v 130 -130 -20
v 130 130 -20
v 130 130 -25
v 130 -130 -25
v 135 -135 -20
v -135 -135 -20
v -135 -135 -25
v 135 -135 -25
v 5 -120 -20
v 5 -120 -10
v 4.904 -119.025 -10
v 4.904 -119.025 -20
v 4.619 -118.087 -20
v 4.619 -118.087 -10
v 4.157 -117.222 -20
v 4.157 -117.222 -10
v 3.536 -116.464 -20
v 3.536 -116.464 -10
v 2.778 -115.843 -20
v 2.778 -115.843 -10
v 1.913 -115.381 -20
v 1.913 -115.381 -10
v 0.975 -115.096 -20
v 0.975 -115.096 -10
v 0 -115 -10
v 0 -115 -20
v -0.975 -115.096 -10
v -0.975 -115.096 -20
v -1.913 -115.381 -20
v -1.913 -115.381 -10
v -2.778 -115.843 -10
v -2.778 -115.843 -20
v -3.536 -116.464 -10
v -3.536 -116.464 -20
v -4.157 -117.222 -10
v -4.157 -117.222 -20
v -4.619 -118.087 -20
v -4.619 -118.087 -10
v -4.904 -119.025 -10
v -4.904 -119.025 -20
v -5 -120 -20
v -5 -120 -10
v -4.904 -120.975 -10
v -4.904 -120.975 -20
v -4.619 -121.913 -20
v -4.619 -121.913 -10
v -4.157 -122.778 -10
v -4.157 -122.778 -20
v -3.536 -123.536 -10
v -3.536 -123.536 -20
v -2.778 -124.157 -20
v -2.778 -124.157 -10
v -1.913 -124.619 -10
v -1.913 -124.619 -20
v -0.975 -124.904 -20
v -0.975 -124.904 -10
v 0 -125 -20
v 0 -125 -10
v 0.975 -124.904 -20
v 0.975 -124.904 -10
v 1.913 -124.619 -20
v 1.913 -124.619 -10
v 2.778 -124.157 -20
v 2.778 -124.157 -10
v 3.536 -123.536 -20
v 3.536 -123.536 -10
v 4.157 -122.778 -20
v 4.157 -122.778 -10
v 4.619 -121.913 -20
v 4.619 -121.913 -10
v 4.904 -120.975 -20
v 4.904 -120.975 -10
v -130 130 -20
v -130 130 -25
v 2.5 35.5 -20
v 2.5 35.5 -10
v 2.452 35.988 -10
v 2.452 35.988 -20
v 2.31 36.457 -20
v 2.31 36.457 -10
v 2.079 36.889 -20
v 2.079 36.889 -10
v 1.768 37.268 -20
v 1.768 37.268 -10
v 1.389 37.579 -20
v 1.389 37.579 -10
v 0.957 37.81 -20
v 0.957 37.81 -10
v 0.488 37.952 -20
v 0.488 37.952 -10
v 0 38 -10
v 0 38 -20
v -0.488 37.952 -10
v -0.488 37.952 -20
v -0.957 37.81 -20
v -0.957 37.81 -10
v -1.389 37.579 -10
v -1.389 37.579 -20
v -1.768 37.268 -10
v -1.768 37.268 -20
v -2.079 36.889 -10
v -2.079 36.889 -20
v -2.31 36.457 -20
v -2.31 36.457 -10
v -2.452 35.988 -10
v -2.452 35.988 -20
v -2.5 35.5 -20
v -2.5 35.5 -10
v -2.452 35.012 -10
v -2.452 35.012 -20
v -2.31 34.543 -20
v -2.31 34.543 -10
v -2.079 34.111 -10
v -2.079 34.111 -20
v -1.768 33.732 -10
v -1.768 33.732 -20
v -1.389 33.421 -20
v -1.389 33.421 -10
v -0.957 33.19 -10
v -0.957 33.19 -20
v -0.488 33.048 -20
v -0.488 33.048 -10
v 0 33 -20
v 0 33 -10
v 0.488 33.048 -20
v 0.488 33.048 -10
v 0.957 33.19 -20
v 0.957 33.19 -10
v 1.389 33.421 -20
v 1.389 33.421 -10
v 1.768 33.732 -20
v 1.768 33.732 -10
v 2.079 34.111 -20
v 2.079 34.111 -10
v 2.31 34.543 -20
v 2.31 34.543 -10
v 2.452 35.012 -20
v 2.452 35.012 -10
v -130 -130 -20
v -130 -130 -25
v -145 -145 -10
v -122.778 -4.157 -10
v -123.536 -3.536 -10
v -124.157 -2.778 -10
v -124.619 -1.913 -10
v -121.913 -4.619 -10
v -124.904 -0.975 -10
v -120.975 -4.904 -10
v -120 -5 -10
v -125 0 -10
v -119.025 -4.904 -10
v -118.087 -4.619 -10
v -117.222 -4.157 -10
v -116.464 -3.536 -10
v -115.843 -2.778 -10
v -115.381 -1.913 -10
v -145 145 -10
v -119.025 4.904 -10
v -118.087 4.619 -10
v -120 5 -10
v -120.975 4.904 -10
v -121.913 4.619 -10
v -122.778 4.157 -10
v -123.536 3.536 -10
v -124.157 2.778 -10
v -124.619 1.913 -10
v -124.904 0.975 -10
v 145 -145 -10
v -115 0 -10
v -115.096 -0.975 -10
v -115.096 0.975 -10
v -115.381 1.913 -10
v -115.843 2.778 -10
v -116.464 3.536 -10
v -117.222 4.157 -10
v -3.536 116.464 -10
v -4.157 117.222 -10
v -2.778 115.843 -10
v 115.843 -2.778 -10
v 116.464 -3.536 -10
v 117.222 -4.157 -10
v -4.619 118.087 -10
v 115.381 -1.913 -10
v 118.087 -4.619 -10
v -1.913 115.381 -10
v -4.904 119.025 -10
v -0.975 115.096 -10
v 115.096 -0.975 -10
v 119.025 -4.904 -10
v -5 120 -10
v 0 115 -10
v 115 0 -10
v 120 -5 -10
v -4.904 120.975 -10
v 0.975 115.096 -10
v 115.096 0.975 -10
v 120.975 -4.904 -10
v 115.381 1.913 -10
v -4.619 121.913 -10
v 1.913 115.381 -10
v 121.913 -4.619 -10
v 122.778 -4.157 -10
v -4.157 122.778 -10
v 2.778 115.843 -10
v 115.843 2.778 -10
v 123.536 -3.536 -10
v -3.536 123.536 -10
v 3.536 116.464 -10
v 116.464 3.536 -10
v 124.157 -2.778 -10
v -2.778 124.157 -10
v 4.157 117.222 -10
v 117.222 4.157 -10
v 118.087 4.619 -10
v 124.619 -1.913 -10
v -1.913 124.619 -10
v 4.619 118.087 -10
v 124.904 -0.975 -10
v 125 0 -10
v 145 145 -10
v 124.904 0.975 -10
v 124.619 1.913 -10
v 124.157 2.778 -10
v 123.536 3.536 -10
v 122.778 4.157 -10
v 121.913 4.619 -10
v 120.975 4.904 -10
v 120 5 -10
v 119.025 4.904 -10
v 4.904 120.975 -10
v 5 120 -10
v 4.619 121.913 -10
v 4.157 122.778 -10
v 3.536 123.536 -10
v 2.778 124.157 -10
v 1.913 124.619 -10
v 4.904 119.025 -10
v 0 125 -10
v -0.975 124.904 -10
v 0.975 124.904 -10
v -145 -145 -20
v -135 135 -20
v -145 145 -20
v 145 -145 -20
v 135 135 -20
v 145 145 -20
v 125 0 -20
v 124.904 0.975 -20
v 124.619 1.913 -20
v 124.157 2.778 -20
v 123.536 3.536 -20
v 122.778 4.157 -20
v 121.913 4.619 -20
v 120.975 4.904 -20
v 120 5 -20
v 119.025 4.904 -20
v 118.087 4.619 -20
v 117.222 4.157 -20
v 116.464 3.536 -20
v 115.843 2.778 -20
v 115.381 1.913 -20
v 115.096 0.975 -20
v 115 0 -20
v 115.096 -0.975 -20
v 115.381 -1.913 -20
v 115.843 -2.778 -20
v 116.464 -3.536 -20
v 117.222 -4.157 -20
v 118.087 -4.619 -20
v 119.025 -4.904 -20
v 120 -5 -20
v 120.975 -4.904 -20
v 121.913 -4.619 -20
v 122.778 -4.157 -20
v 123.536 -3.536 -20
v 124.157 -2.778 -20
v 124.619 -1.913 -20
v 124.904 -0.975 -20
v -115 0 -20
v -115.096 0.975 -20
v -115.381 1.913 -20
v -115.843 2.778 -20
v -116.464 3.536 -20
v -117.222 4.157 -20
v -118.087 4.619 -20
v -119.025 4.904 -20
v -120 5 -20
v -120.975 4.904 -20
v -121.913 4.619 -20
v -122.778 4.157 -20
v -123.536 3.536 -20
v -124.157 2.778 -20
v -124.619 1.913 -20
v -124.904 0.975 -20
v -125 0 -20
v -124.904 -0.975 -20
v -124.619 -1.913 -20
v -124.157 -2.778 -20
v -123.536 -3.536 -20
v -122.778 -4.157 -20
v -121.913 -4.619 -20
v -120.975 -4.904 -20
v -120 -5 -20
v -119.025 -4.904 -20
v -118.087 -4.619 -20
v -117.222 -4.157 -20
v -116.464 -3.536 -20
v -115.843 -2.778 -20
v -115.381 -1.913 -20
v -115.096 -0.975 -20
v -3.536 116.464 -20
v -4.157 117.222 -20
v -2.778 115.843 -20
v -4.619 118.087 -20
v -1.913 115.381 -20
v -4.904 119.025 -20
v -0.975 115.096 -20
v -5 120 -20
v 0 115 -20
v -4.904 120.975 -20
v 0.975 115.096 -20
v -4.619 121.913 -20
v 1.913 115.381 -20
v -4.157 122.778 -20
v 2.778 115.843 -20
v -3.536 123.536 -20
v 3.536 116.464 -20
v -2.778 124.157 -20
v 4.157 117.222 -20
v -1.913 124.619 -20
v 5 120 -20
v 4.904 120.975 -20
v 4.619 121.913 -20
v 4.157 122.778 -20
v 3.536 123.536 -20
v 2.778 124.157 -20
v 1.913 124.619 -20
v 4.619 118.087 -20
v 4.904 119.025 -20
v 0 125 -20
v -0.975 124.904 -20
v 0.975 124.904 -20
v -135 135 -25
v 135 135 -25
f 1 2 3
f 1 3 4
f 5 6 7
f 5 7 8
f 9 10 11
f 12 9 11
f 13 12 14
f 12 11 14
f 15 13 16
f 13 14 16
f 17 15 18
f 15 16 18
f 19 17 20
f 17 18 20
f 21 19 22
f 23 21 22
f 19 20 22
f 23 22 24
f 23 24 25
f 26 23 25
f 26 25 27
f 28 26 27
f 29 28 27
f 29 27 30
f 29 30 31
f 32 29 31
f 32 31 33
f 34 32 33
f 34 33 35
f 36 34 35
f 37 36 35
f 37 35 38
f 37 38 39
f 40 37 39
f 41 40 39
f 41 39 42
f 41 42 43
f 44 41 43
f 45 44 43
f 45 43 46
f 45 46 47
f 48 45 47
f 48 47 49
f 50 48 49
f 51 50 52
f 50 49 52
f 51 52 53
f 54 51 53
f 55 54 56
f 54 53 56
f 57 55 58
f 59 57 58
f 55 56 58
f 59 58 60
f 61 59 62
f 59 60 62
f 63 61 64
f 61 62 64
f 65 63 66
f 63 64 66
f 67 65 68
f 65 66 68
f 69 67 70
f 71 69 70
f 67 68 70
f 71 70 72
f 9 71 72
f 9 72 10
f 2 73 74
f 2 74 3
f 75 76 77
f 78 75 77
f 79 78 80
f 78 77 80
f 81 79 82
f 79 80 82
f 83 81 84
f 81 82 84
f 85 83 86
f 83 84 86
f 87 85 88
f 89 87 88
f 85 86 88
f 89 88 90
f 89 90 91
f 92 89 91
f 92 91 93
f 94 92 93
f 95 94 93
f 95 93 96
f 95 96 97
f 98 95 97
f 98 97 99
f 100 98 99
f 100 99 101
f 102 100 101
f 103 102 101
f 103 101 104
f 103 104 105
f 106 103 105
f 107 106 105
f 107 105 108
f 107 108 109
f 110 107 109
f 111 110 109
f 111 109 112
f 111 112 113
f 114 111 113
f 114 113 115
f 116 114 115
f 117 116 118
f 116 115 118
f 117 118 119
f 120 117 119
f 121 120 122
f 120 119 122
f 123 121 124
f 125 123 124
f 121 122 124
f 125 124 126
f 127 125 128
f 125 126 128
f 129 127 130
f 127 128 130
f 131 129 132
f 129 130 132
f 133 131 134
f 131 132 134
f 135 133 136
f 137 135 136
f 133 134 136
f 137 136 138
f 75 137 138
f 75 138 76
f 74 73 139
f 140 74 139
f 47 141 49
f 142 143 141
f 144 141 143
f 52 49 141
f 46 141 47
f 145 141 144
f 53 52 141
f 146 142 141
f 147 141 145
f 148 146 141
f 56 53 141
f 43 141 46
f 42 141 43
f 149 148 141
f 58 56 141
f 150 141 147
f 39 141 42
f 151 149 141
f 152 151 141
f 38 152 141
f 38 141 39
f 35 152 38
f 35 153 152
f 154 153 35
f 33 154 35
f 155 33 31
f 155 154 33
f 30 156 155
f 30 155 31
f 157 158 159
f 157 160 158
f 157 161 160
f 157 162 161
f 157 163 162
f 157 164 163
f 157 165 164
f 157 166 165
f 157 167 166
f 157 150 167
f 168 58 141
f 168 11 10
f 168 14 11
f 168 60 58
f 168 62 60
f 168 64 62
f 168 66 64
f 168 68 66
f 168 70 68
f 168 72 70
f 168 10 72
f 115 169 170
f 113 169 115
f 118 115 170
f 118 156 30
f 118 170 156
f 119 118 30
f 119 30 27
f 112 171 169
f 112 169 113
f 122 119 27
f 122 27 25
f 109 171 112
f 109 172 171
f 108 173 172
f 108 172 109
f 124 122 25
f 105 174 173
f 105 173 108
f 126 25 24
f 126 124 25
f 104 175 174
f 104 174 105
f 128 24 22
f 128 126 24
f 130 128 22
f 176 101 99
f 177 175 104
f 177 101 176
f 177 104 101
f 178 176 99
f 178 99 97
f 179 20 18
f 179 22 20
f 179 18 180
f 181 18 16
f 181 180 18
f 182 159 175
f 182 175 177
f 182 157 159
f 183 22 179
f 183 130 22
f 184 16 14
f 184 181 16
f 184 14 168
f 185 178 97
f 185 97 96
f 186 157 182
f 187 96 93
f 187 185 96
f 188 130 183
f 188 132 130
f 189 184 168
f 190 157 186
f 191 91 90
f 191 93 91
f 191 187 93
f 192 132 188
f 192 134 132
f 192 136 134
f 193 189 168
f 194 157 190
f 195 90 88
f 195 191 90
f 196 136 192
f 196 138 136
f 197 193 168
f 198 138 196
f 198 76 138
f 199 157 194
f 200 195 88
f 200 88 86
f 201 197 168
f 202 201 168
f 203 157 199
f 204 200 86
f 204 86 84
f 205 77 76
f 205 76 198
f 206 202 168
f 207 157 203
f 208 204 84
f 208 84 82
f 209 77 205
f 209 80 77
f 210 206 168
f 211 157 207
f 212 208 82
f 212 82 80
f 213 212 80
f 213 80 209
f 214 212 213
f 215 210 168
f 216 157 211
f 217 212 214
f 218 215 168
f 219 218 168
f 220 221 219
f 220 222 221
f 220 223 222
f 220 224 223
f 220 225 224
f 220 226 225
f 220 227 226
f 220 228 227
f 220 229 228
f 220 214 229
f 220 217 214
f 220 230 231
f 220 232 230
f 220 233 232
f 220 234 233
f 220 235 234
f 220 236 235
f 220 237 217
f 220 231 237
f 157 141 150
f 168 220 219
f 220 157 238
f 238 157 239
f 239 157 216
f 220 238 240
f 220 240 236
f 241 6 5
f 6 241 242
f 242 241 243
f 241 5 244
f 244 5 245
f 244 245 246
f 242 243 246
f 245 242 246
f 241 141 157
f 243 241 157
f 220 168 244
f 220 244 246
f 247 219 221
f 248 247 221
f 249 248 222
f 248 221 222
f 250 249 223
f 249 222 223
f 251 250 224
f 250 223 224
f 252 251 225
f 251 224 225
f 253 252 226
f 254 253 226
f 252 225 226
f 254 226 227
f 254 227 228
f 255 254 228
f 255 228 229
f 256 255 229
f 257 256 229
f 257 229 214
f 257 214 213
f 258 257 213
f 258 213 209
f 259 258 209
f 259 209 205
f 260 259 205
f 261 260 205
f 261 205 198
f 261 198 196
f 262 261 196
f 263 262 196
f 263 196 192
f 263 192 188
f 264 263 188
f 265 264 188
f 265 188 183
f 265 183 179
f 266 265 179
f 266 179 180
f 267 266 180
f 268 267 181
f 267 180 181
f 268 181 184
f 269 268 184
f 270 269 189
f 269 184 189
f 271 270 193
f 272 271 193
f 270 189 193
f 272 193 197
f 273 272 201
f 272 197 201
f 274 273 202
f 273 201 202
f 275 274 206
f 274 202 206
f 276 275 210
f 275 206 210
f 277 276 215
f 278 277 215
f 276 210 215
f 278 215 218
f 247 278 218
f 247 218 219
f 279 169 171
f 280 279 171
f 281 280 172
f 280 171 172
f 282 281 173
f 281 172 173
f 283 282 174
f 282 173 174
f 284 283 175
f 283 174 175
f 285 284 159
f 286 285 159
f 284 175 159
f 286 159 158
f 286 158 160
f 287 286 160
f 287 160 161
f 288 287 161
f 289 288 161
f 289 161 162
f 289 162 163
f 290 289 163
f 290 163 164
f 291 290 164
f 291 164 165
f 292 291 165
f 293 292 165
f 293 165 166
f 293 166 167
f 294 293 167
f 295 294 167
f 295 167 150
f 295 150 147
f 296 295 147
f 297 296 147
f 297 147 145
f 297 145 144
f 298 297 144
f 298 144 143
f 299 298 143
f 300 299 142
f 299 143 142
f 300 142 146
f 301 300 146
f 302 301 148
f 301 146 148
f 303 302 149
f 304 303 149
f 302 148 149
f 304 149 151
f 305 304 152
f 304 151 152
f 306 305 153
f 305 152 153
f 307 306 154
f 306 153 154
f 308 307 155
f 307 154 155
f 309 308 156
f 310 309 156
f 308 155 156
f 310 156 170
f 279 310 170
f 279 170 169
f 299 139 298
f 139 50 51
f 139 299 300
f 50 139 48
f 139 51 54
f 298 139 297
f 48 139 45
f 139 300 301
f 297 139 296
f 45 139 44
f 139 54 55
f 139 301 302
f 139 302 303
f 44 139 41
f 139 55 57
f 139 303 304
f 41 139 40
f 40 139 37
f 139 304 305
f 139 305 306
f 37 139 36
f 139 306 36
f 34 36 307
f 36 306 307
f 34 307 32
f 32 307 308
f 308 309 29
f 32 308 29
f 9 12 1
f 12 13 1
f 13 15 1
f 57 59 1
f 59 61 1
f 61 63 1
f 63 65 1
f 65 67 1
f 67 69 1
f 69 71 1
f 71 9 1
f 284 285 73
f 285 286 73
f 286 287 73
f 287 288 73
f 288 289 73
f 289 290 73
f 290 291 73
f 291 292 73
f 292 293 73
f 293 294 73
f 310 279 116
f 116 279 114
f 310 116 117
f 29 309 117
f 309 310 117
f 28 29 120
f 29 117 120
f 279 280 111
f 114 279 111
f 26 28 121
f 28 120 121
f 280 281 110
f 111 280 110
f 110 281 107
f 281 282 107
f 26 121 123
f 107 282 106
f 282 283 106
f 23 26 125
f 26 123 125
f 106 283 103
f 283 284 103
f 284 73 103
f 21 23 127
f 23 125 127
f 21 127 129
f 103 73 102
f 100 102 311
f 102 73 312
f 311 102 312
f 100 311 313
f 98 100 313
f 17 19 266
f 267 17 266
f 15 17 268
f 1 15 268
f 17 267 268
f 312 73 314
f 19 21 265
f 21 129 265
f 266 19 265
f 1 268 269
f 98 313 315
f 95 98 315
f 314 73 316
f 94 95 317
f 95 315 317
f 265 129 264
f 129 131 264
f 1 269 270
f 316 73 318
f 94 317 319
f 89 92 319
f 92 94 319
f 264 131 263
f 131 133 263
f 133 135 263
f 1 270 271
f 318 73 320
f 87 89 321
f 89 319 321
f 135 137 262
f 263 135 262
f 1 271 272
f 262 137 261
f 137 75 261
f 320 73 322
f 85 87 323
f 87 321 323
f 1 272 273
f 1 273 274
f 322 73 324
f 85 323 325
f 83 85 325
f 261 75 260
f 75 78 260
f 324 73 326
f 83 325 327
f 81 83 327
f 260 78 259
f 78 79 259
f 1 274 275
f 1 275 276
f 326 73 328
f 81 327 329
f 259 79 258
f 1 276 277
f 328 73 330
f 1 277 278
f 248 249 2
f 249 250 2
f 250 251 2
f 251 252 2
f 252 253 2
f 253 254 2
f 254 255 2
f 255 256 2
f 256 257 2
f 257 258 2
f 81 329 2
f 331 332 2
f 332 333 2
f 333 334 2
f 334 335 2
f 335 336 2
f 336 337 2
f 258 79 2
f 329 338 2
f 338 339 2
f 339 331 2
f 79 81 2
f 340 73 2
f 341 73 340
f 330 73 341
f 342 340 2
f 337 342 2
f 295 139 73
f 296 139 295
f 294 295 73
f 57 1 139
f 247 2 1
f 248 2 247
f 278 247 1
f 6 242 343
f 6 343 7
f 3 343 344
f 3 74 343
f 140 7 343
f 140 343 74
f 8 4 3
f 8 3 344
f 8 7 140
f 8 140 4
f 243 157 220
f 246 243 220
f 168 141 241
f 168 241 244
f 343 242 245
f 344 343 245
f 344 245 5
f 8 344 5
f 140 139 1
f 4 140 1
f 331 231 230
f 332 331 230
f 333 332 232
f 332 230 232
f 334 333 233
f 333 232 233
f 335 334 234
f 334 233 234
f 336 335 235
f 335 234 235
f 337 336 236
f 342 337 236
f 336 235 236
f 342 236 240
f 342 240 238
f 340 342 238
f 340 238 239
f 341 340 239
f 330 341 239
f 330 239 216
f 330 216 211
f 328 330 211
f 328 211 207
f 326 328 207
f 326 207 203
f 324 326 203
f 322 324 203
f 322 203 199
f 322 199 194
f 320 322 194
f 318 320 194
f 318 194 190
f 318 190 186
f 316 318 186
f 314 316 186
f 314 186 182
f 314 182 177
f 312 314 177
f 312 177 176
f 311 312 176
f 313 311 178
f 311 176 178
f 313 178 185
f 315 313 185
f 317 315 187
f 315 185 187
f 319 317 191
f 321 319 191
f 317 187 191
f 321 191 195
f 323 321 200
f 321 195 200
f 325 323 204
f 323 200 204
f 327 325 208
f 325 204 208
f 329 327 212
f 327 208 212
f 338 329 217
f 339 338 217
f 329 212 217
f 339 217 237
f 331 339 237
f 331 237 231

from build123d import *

# Parameters (mm, degrees)
SKETCH105_W     = 290
SKETCH105_H     = 290
PAD053_DEPTH    = 10
SKETCH106_R     = 5
SKETCH106_R_2   = 2.5
POCKET048_DEPTH = 10.001
SKETCH107_W     = 270
SKETCH107_H     = 270
SKETCH107_W_2   = 260
SKETCH107_H_2   = 260
PAD054_DEPTH    = 5


with BuildPart() as part:
    # Sketch105 → Pad053 (new body)
    with BuildSketch(Plane.XY):
        Rectangle(SKETCH105_W, SKETCH105_H)
    extrude(amount=-PAD053_DEPTH)

    # Sketch106 (on Face5 of Pad053) → Pocket048 (cut, through all)
    with BuildSketch(Plane.XY):
        with Locations((-120, 0)):
            Circle(SKETCH106_R)
        with Locations((0, 120)):
            Circle(SKETCH106_R)
        with Locations((120, 0)):
            Circle(SKETCH106_R)
        with Locations((0, -120)):
            Circle(SKETCH106_R)
        with Locations((0, 35.5)):
            Circle(SKETCH106_R_2)
    extrude(amount=-POCKET048_DEPTH, mode=Mode.SUBTRACT)

    # Sketch107 (on Face5 of Pocket048) → Pad054 (join)
    with BuildSketch(Plane(origin=(0, 0, -10), x_dir=(1, 0, 0), z_dir=(0, 0, -1))):
        Rectangle(SKETCH107_W, SKETCH107_H)
        Rectangle(SKETCH107_W_2, SKETCH107_H_2, mode=Mode.SUBTRACT)
    extrude(amount=PAD054_DEPTH)


with BuildPart() as part_1:
    # Body028 placement: moved
    add(part.part.moved(Location((0, 0, -10))))


solid = part_1.part
